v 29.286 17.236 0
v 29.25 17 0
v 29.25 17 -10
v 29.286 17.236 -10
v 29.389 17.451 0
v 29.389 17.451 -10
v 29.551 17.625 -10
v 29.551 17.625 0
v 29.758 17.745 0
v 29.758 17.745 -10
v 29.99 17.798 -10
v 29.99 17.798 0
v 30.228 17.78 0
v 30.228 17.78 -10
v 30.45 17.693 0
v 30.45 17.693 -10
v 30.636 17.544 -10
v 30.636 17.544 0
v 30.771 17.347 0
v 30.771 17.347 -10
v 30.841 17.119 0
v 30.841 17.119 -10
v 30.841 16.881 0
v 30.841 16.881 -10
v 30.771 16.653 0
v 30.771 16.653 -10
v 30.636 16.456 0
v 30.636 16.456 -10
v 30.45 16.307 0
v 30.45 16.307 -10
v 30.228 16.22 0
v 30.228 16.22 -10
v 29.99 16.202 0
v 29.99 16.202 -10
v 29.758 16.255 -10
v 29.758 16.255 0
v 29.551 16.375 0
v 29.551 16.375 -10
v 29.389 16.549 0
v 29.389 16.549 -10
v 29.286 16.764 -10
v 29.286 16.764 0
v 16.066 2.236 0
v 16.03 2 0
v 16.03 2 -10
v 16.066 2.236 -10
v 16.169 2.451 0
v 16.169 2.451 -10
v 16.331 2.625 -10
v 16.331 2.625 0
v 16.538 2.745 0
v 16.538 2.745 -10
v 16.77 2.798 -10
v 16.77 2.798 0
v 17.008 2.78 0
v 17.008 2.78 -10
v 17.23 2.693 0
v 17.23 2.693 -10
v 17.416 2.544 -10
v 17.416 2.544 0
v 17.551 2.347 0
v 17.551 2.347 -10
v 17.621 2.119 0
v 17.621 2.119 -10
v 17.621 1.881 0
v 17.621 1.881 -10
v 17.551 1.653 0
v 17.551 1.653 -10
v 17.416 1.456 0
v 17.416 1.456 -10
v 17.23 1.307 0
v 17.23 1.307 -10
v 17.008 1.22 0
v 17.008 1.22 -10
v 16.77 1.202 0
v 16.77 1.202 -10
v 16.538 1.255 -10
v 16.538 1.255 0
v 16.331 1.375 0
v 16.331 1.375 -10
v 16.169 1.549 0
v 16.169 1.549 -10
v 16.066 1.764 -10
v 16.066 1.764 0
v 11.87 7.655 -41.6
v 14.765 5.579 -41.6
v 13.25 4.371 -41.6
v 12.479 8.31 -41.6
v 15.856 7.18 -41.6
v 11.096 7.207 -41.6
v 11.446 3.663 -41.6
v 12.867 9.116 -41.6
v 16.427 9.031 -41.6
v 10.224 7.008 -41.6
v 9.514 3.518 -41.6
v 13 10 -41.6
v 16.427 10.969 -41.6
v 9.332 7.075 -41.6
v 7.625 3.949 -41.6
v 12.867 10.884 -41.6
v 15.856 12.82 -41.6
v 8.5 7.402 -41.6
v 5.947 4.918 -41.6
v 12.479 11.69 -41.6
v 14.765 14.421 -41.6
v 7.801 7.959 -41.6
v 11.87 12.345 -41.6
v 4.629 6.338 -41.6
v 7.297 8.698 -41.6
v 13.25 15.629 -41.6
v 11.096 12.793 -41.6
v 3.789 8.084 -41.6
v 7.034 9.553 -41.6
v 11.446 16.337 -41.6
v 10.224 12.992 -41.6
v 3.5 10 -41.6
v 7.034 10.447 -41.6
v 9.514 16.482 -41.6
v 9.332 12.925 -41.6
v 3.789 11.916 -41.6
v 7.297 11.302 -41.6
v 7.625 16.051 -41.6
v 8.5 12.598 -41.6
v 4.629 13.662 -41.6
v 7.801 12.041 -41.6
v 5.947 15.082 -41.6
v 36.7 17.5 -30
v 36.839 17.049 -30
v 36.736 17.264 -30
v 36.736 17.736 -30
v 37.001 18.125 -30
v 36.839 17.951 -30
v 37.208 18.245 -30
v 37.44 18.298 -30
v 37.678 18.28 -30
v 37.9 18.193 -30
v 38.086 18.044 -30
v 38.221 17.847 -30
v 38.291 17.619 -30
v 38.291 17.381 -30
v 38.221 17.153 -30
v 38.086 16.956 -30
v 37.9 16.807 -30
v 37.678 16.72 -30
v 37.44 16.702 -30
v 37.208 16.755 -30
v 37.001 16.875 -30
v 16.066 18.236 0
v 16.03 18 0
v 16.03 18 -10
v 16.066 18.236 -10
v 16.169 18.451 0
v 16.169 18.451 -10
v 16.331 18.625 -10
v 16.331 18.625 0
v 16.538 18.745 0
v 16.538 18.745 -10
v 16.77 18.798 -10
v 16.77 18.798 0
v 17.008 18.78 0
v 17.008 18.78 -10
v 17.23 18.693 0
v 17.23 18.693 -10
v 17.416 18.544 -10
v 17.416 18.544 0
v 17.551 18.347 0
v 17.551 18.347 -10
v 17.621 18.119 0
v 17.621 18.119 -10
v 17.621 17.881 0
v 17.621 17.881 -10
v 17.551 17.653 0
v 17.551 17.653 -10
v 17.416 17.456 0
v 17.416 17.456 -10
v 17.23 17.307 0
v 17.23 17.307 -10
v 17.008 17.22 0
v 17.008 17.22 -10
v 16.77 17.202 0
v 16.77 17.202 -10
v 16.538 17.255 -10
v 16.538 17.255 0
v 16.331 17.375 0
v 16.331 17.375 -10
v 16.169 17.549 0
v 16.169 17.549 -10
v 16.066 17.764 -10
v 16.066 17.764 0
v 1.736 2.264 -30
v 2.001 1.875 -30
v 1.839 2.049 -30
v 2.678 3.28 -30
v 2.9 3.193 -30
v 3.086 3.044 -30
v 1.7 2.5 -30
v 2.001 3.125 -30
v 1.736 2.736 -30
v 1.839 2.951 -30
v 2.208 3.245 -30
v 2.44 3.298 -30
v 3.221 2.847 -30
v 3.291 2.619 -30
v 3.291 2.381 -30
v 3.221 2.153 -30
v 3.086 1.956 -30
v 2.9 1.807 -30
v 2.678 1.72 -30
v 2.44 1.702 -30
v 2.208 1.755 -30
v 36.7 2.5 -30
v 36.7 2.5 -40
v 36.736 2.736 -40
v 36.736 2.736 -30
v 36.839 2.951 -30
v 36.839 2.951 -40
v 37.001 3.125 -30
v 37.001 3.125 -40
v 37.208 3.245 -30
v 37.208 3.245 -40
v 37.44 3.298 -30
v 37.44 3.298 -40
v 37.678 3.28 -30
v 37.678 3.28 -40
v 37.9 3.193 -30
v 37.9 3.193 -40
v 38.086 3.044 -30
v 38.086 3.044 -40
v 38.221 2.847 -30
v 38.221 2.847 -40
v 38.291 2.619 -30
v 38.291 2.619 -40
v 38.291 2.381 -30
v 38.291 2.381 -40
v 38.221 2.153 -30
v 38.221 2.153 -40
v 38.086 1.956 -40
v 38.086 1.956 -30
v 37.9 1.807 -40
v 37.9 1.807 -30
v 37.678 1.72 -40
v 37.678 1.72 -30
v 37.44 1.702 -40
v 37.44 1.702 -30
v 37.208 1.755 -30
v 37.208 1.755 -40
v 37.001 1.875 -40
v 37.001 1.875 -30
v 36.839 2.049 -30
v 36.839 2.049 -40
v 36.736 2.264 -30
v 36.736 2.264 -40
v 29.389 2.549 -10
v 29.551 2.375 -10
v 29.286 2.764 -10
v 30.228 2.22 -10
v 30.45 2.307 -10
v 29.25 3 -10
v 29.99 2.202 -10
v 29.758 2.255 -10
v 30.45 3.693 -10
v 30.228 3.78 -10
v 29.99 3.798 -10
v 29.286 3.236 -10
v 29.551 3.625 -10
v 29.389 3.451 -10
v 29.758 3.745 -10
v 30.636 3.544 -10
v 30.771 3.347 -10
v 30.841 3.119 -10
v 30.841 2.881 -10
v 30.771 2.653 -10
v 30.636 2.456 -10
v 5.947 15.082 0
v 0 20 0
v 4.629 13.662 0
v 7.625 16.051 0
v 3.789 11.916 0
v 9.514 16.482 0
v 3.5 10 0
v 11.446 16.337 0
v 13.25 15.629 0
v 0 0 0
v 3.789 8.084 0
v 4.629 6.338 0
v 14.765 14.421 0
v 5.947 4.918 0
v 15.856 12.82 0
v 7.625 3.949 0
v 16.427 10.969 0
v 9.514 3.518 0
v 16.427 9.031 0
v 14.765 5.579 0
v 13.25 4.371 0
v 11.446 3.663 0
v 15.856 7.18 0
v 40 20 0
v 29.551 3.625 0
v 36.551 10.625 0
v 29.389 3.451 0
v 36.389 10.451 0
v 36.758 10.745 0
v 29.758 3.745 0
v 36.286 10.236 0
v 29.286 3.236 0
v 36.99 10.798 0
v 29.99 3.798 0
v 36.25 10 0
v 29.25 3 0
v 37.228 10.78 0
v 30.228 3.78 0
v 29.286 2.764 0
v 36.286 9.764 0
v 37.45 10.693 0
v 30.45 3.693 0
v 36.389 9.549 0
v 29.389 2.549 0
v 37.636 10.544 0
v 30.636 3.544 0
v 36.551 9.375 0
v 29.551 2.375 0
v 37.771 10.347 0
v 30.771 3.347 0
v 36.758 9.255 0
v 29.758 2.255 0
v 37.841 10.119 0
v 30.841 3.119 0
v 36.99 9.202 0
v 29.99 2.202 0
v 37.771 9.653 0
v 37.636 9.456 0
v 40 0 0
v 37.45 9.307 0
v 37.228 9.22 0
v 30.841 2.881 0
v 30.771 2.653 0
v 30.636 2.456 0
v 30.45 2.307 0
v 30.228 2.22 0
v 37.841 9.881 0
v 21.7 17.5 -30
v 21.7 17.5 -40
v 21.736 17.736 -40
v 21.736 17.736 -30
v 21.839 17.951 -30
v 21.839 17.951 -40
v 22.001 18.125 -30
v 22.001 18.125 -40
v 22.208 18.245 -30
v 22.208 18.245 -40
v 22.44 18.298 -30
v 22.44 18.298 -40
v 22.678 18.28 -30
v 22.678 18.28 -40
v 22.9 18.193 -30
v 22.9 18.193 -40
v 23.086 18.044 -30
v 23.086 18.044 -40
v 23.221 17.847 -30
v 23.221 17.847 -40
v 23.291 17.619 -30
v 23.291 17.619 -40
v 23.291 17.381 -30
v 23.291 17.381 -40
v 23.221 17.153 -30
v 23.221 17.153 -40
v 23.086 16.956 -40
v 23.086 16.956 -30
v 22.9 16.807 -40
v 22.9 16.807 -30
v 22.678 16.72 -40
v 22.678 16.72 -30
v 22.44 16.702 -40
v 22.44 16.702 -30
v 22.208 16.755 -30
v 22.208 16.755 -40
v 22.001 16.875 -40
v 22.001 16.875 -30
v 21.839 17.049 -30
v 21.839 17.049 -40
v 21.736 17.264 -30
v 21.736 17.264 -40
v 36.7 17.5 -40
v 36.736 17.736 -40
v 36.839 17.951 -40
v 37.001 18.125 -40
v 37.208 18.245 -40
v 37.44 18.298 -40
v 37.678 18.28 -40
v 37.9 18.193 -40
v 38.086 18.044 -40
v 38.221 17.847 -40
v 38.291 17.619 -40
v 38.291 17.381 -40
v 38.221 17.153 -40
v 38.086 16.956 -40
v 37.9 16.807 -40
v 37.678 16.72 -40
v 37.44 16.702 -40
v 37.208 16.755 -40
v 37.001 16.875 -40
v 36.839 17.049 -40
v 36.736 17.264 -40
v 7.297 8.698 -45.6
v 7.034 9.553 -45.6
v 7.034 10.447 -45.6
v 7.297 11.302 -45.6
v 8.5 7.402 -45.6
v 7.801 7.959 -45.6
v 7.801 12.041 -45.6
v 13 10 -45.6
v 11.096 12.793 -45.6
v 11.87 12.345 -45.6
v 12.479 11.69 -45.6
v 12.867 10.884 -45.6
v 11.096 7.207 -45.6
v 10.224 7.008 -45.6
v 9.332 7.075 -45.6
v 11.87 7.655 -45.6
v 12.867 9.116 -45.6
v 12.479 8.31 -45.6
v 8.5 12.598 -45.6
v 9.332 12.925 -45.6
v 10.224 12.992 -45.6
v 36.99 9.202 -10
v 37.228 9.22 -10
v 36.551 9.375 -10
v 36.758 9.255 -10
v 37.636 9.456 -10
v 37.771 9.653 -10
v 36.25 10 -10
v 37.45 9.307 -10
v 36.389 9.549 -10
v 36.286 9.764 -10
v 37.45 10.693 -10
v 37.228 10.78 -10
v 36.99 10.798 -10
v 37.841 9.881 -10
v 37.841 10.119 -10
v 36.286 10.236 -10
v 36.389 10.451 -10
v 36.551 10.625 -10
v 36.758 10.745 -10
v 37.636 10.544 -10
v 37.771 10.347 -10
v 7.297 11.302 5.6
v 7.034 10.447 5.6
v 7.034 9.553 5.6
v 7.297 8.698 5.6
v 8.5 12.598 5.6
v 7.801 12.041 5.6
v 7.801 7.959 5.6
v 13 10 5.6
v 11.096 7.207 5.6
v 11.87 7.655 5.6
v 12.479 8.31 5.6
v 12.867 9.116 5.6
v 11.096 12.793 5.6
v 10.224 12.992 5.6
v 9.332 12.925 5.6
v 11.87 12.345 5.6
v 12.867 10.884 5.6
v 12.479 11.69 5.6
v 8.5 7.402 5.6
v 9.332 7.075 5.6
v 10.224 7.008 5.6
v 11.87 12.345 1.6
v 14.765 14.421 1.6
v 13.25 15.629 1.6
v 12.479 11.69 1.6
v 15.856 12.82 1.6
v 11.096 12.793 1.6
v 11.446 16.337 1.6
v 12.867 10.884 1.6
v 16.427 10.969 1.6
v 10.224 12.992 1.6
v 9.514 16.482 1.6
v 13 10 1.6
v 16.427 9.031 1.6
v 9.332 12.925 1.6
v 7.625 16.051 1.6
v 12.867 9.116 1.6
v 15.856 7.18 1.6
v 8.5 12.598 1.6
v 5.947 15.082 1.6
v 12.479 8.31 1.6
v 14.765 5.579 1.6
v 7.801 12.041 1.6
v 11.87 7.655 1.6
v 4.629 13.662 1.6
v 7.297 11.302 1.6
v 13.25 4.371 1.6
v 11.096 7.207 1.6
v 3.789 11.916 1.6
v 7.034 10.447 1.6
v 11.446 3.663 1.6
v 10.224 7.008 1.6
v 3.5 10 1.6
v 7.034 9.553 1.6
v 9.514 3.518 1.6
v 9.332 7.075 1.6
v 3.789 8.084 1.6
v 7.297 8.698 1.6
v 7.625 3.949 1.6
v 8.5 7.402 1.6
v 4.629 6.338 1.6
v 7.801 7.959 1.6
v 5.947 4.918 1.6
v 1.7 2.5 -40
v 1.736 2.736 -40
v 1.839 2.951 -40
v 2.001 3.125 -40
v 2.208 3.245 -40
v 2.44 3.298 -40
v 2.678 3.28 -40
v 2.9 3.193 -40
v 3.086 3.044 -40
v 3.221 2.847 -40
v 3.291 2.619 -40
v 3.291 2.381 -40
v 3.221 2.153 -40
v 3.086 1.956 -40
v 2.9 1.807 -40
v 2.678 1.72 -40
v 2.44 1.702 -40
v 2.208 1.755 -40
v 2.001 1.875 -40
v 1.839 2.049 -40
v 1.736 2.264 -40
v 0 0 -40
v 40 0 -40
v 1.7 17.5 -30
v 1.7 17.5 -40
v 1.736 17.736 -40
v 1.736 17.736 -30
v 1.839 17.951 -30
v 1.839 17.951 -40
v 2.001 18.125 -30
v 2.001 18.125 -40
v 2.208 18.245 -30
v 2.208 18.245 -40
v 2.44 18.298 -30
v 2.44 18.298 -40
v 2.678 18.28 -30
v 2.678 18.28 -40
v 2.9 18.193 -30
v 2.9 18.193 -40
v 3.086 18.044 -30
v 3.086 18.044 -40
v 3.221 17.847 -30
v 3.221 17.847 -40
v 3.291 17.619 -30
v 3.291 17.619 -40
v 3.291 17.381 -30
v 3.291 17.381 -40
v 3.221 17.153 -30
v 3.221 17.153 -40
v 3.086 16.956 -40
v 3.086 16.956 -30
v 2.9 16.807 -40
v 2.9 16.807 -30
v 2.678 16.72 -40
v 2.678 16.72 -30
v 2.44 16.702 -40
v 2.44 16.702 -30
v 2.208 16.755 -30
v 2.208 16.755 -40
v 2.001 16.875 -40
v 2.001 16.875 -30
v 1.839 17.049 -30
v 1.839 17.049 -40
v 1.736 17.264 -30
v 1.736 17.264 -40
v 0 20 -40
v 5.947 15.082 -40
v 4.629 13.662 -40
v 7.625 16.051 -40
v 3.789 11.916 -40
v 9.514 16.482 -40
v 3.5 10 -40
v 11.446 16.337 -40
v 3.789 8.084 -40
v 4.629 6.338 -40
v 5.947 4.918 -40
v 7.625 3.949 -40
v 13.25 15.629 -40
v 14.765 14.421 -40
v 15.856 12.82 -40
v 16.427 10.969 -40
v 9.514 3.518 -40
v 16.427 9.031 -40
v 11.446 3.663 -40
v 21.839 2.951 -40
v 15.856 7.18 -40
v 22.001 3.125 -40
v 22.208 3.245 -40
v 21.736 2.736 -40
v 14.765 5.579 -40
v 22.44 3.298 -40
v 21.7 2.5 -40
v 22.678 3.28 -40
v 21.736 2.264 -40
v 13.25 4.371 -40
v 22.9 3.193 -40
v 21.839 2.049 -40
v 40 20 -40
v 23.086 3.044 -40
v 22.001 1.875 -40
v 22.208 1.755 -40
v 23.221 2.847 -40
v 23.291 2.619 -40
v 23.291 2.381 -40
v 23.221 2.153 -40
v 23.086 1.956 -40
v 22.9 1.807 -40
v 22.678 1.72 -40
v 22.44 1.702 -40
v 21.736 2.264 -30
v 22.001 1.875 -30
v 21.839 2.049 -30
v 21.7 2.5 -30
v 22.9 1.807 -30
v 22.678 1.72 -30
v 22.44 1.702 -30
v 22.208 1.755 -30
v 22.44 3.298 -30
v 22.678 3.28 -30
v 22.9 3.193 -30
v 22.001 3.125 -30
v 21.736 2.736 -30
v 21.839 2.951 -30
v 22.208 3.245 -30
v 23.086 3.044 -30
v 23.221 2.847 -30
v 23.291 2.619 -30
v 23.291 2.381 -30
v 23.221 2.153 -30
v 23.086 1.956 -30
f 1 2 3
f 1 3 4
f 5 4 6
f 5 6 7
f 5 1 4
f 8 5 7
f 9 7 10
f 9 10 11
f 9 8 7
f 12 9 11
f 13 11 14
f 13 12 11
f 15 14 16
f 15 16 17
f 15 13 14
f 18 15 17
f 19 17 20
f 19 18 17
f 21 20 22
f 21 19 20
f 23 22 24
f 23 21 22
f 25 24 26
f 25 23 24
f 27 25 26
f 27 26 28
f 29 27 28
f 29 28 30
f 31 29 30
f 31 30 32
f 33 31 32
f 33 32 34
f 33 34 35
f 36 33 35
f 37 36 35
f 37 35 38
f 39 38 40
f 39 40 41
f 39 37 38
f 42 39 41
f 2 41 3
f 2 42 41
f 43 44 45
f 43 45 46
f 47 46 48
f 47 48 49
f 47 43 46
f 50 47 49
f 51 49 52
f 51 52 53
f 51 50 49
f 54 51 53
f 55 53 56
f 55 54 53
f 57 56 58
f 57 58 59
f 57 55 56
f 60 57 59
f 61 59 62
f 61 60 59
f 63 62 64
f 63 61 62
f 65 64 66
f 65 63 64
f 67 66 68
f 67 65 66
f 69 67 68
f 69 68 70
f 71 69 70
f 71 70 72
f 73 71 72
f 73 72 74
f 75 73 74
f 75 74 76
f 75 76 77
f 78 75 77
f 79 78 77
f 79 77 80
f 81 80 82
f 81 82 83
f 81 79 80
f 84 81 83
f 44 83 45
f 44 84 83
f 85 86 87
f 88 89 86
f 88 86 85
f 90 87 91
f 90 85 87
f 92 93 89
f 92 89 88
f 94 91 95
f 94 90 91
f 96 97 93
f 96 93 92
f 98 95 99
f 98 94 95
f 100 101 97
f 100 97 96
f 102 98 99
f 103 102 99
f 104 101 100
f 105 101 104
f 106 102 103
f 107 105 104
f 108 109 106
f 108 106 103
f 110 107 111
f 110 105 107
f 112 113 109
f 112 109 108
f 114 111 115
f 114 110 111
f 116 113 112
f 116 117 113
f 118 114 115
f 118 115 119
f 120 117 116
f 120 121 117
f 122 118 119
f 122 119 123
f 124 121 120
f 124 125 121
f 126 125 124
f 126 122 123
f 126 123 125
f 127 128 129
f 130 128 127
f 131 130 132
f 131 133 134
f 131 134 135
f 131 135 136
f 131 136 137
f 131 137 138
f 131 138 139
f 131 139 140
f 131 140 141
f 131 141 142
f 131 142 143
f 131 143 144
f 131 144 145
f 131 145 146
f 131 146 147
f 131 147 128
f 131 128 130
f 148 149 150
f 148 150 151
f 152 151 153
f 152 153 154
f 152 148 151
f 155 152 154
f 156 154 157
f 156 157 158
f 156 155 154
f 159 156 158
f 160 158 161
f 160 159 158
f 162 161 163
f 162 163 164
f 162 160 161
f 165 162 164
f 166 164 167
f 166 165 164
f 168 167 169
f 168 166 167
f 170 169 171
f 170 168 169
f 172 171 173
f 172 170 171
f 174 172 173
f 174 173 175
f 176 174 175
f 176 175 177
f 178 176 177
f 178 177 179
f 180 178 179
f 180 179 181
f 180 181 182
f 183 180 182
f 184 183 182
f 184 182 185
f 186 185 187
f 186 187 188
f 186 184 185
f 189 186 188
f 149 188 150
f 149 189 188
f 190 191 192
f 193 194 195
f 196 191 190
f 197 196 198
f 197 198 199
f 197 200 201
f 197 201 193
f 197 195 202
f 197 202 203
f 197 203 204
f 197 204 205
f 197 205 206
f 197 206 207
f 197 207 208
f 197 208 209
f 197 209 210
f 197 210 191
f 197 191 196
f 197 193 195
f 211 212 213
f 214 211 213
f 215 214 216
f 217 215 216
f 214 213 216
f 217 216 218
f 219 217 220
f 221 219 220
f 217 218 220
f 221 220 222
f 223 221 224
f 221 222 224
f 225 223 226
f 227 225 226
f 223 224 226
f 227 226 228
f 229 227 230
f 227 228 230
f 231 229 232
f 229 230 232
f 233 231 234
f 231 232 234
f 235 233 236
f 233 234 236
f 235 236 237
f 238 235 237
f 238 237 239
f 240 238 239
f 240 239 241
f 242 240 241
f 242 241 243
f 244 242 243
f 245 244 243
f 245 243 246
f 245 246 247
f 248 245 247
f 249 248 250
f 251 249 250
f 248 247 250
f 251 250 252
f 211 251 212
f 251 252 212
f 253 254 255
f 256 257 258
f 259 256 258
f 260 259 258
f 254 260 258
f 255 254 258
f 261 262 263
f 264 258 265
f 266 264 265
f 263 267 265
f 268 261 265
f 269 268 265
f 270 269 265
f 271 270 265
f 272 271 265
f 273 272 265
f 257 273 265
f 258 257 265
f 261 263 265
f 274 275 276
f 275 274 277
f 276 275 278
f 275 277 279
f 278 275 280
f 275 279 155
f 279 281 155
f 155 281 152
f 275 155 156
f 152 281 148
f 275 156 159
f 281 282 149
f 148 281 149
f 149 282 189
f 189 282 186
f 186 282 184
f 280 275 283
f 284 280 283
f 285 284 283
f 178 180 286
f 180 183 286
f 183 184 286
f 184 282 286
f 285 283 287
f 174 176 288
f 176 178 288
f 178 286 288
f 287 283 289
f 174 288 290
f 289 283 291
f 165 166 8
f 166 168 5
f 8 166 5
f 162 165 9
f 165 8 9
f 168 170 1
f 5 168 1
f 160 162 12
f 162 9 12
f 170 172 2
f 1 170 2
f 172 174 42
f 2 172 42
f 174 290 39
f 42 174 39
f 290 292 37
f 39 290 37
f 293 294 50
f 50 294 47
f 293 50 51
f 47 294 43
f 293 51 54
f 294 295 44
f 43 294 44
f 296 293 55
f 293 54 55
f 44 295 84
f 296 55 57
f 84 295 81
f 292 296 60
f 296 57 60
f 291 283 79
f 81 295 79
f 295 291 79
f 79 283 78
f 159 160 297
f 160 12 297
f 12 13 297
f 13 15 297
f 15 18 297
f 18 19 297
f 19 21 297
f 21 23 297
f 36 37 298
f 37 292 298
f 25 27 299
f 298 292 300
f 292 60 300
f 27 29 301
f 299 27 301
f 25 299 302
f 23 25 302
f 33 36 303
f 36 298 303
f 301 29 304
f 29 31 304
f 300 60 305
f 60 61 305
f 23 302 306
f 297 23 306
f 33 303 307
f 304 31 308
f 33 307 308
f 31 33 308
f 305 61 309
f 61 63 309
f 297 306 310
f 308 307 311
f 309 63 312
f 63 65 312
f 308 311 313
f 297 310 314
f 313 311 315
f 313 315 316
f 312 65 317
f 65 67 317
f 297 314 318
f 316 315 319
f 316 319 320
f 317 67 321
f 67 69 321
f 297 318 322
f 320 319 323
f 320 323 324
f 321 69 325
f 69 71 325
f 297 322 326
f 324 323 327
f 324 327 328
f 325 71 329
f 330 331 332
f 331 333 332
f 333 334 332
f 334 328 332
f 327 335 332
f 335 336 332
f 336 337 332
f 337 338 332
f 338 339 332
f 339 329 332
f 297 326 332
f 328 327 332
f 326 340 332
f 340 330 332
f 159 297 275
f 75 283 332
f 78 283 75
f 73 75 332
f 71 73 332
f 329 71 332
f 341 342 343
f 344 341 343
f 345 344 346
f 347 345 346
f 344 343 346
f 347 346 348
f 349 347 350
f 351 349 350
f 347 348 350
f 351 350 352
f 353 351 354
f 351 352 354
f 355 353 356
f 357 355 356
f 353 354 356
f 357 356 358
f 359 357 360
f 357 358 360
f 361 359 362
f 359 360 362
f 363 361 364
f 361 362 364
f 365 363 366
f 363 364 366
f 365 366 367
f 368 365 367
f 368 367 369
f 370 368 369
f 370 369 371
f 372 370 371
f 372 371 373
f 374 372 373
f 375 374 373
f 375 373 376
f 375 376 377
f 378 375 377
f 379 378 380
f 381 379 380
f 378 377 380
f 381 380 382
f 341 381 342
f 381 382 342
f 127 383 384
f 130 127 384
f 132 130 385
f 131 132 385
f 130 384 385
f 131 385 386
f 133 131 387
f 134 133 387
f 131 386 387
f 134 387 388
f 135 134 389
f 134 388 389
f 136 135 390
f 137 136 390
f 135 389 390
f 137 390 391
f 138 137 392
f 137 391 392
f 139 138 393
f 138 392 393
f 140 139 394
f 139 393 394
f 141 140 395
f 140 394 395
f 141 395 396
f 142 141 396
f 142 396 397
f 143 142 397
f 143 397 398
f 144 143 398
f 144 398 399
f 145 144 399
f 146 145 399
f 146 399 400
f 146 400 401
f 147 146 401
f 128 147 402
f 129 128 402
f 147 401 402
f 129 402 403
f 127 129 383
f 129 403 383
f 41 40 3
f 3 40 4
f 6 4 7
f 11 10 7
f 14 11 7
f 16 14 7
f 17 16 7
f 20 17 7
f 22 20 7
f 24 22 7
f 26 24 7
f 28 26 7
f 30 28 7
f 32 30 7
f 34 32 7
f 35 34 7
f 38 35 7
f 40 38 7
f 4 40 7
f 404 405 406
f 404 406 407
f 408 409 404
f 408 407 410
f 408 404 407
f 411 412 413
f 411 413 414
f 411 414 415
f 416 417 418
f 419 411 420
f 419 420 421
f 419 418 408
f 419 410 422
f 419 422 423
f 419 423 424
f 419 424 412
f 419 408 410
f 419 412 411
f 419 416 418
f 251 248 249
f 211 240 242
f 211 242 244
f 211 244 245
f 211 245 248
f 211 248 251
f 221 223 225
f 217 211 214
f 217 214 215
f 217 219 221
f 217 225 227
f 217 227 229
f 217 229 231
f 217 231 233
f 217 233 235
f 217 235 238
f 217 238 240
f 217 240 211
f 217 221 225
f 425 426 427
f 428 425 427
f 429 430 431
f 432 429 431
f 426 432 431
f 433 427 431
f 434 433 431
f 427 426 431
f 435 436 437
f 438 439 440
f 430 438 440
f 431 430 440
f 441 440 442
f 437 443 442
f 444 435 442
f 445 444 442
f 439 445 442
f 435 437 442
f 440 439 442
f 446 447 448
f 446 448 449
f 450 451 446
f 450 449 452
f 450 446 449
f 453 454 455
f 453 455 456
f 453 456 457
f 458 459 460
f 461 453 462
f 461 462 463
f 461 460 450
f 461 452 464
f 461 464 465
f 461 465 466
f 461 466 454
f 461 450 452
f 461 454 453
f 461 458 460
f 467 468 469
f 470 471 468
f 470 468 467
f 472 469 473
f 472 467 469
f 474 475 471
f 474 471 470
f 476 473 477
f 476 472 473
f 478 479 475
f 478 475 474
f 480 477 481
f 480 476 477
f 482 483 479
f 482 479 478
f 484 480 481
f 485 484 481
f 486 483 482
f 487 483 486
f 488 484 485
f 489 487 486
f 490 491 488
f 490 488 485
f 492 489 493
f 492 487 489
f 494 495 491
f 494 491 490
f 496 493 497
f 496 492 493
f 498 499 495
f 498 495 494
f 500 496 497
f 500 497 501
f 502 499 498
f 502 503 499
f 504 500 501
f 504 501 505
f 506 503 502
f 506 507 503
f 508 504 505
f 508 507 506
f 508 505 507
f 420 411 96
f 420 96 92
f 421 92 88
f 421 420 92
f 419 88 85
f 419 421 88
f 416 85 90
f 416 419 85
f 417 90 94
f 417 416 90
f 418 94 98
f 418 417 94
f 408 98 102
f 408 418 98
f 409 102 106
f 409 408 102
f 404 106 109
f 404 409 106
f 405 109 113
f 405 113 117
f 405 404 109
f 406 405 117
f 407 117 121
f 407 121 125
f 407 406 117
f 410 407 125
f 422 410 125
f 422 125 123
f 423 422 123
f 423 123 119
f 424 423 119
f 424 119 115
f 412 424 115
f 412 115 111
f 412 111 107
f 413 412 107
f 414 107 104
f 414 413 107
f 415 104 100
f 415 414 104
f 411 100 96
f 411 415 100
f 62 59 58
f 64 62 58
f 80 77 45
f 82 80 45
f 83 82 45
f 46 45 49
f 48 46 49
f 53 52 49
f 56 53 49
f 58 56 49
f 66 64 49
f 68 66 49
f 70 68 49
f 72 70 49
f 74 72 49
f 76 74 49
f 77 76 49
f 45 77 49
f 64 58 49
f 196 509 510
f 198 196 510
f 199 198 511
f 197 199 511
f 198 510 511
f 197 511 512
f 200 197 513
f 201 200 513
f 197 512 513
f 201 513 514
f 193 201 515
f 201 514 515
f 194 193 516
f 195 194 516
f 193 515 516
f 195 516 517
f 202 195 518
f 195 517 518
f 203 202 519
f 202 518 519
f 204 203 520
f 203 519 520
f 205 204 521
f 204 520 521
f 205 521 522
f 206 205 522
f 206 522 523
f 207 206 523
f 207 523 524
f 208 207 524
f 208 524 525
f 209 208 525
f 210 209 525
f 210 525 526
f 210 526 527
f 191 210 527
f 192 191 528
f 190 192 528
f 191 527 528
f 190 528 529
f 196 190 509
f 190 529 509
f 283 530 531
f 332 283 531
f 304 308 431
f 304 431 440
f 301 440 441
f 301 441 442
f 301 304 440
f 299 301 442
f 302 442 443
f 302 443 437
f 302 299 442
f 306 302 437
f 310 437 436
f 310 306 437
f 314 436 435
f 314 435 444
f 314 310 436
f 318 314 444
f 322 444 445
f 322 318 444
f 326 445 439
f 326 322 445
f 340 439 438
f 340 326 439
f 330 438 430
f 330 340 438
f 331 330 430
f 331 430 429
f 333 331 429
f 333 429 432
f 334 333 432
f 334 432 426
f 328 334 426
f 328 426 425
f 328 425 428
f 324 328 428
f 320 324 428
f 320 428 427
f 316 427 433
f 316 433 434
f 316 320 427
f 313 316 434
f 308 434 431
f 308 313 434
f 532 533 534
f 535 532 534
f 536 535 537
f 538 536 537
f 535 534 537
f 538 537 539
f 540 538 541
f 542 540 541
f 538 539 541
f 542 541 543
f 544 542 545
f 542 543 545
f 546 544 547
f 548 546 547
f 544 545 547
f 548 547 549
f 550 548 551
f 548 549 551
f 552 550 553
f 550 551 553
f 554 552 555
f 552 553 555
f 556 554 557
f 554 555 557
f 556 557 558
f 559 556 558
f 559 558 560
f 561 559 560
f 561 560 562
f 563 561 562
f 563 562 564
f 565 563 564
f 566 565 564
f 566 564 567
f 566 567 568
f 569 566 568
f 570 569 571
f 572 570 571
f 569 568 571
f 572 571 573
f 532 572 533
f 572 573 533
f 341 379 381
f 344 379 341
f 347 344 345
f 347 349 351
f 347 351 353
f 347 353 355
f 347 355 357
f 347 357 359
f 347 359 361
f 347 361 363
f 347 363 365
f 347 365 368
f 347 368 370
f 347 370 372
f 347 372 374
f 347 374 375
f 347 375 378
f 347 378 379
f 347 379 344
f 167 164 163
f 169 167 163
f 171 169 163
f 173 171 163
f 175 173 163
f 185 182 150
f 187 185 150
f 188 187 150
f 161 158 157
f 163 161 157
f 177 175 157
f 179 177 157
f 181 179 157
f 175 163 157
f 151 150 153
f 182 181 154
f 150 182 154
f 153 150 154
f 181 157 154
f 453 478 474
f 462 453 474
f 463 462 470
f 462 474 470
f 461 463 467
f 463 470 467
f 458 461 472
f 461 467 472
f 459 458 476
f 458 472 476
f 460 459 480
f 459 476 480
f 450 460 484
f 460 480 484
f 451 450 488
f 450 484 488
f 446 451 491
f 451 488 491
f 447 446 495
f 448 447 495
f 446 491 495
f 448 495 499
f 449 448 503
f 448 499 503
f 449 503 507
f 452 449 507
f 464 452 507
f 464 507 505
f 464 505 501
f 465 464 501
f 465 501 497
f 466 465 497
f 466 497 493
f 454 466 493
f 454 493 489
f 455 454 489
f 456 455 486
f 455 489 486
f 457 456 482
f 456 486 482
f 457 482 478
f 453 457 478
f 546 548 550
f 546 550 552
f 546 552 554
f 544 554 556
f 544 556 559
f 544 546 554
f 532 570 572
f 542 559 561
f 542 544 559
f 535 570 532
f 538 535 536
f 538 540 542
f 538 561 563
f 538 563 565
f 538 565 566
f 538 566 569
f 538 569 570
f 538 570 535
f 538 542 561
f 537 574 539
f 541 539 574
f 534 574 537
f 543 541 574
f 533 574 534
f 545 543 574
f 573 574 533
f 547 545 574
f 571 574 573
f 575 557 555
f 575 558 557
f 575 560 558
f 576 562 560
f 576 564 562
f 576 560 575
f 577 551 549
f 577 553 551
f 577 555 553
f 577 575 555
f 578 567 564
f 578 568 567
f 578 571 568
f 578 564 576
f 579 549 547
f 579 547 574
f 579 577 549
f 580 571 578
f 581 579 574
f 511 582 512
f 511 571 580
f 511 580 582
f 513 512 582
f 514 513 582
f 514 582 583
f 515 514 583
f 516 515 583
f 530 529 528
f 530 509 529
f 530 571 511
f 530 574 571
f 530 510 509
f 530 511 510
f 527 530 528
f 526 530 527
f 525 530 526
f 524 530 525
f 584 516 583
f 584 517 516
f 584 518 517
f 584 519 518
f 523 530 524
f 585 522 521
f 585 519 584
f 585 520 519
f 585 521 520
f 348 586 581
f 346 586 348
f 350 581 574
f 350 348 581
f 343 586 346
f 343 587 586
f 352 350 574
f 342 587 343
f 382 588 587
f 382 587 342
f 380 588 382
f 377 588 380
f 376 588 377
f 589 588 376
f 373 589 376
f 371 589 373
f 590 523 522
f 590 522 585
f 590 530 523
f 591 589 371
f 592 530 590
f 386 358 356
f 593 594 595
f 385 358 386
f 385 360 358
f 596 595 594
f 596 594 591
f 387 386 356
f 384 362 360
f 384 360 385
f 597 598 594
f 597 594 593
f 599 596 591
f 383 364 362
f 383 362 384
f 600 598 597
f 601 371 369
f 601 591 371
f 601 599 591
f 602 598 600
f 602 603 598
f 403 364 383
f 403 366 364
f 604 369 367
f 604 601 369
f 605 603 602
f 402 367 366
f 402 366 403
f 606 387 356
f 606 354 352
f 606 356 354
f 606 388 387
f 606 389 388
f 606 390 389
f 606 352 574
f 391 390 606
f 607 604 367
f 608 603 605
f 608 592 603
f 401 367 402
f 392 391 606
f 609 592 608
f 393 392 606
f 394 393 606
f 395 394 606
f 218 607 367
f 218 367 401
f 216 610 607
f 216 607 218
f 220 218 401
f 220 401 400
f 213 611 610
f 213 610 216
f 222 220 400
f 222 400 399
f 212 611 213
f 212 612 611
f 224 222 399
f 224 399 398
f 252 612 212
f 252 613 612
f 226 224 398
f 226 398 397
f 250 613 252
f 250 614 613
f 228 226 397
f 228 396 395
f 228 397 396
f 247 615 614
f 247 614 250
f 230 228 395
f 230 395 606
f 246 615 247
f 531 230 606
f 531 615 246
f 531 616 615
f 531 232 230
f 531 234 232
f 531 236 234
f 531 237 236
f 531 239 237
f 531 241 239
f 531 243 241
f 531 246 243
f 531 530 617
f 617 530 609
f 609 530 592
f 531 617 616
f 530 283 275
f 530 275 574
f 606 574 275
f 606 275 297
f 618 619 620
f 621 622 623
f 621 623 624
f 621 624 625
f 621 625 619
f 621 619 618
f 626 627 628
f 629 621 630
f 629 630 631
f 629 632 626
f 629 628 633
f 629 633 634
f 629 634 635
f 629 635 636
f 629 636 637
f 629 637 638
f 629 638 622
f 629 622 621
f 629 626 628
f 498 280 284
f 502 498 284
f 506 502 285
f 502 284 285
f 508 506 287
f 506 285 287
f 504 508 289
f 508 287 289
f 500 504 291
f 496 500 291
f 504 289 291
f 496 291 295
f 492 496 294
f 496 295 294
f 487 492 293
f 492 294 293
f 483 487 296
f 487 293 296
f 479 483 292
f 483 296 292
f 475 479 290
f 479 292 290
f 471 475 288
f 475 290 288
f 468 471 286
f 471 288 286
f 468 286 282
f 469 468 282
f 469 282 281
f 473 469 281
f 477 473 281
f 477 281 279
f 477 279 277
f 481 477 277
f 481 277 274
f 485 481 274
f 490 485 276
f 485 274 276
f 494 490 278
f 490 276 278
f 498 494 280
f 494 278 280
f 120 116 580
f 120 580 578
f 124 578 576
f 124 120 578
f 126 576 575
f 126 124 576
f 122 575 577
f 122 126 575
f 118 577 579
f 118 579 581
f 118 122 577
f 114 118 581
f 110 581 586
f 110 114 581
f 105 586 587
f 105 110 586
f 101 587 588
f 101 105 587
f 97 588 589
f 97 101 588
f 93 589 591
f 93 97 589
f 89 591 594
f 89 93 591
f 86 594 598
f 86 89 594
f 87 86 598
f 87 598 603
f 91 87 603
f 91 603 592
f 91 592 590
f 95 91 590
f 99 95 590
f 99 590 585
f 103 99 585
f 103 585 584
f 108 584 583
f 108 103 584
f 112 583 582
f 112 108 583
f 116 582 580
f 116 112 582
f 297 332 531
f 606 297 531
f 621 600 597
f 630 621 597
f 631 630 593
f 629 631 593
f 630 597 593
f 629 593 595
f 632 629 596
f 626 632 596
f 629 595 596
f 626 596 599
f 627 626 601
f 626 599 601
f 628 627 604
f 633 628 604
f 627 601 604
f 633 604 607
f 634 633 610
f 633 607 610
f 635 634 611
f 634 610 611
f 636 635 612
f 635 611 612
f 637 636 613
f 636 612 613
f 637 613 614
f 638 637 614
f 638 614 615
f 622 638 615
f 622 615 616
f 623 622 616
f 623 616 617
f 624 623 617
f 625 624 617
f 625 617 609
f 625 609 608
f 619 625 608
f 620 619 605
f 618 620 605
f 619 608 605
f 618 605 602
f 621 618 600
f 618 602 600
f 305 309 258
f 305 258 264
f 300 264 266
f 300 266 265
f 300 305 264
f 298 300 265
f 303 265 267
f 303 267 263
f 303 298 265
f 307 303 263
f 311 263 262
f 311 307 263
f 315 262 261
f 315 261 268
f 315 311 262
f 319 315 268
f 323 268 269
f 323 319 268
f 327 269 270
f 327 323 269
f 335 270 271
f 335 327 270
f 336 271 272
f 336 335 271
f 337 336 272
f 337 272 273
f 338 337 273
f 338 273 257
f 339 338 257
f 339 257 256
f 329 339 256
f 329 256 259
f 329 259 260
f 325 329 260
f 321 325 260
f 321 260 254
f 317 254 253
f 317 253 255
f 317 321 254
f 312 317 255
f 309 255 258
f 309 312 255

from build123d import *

# Parameters (mm, degrees)
SKETCH1_W              = 40
SKETCH1_H              = 40
BODY_DEPTH             = 20
SKETCH2_R              = 0.8
ROTORSIDE_HOLES_DEPTH  = 10
SKETCH3_R              = 0.8
SLIDERSIDE_HOLES_DEPTH = 10
SKETCH4_R              = 6.5
ROTOREXTEND_DEPTH      = 1.6
SKETCH5_R              = 3
ROTOR_DEPTH            = 4
SLIDEREXTEND_START     = 1.6
SKETCH6_R              = 6.5
SLIDEREXTEND_DEPTH     = 1.6
SLIDER_START           = 4
SKETCH7_R              = 3
SLIDER_DEPTH           = 4


with BuildPart() as part:
    # Sketch1 → Body (new body)
    with BuildSketch(Plane(origin=(0, 0, 0), x_dir=(1, 0, 0), z_dir=(0, 1, 0))):
        with Locations((20, 20)):
            Rectangle(SKETCH1_W, SKETCH1_H)
    extrude(amount=BODY_DEPTH)

    # Sketch2 → RotorSide-Holes (cut)
    with BuildSketch(Plane(origin=(0, 20, 0), x_dir=(1, 0, 0), z_dir=(0, 0, -1))):
        with Locations((30.05, 3)):
            Circle(SKETCH2_R)
        with Locations((37.05, 10)):
            Circle(SKETCH2_R)
        with Locations((30.05, 17)):
            Circle(SKETCH2_R)
        with Locations((16.83, 2)):
            Circle(SKETCH2_R)
        with Locations((16.83, 18)):
            Circle(SKETCH2_R)
    extrude(amount=ROTORSIDE_HOLES_DEPTH, mode=Mode.SUBTRACT)

    # Sketch3 → SliderSide-Holes (cut)
    with BuildSketch(Plane(origin=(0, 0, -40), x_dir=(-1, 0, 0), z_dir=(0, 0, -1))):
        with Locations((-37.5, 17.5)):
            Circle(SKETCH3_R)
        with Locations((-37.5, 2.5)):
            Circle(SKETCH3_R)
        with Locations((-22.5, 17.5)):
            Circle(SKETCH3_R)
        with Locations((-22.5, 2.5)):
            Circle(SKETCH3_R)
        with Locations((-2.5, 17.5)):
            Circle(SKETCH3_R)
        with Locations((-2.5, 2.5)):
            Circle(SKETCH3_R)
    extrude(amount=-SLIDERSIDE_HOLES_DEPTH, mode=Mode.SUBTRACT)

    # Sketch4 → RotorExtend (add)
    with BuildSketch(Plane.XY):
        with Locations((10, 10)):
            Circle(SKETCH4_R)
    extrude(amount=ROTOREXTEND_DEPTH)

    # Sketch5 → Rotor (add)
    with BuildSketch(Plane.XY.offset(1.6)):
        with Locations((10, 10)):
            Circle(SKETCH5_R)
    extrude(amount=ROTOR_DEPTH)

    # Sketch6 → SliderExtend (add)
    with BuildSketch(Plane(origin=(0, 0, -40), x_dir=(-1, 0, 0), z_dir=(0, 0, -1)).offset(SLIDEREXTEND_START)):
        with Locations((-10, 10)):
            Circle(SKETCH6_R)
    extrude(amount=-SLIDEREXTEND_DEPTH)

    # Sketch7 → Slider (add)
    with BuildSketch(Plane(origin=(0, 0, -41.6), x_dir=(-1, 0, 0), z_dir=(0, 0, -1)).offset(SLIDER_START)):
        with Locations((-10, 10)):
            Circle(SKETCH7_R)
    extrude(amount=-SLIDER_DEPTH)


solid = part.part
